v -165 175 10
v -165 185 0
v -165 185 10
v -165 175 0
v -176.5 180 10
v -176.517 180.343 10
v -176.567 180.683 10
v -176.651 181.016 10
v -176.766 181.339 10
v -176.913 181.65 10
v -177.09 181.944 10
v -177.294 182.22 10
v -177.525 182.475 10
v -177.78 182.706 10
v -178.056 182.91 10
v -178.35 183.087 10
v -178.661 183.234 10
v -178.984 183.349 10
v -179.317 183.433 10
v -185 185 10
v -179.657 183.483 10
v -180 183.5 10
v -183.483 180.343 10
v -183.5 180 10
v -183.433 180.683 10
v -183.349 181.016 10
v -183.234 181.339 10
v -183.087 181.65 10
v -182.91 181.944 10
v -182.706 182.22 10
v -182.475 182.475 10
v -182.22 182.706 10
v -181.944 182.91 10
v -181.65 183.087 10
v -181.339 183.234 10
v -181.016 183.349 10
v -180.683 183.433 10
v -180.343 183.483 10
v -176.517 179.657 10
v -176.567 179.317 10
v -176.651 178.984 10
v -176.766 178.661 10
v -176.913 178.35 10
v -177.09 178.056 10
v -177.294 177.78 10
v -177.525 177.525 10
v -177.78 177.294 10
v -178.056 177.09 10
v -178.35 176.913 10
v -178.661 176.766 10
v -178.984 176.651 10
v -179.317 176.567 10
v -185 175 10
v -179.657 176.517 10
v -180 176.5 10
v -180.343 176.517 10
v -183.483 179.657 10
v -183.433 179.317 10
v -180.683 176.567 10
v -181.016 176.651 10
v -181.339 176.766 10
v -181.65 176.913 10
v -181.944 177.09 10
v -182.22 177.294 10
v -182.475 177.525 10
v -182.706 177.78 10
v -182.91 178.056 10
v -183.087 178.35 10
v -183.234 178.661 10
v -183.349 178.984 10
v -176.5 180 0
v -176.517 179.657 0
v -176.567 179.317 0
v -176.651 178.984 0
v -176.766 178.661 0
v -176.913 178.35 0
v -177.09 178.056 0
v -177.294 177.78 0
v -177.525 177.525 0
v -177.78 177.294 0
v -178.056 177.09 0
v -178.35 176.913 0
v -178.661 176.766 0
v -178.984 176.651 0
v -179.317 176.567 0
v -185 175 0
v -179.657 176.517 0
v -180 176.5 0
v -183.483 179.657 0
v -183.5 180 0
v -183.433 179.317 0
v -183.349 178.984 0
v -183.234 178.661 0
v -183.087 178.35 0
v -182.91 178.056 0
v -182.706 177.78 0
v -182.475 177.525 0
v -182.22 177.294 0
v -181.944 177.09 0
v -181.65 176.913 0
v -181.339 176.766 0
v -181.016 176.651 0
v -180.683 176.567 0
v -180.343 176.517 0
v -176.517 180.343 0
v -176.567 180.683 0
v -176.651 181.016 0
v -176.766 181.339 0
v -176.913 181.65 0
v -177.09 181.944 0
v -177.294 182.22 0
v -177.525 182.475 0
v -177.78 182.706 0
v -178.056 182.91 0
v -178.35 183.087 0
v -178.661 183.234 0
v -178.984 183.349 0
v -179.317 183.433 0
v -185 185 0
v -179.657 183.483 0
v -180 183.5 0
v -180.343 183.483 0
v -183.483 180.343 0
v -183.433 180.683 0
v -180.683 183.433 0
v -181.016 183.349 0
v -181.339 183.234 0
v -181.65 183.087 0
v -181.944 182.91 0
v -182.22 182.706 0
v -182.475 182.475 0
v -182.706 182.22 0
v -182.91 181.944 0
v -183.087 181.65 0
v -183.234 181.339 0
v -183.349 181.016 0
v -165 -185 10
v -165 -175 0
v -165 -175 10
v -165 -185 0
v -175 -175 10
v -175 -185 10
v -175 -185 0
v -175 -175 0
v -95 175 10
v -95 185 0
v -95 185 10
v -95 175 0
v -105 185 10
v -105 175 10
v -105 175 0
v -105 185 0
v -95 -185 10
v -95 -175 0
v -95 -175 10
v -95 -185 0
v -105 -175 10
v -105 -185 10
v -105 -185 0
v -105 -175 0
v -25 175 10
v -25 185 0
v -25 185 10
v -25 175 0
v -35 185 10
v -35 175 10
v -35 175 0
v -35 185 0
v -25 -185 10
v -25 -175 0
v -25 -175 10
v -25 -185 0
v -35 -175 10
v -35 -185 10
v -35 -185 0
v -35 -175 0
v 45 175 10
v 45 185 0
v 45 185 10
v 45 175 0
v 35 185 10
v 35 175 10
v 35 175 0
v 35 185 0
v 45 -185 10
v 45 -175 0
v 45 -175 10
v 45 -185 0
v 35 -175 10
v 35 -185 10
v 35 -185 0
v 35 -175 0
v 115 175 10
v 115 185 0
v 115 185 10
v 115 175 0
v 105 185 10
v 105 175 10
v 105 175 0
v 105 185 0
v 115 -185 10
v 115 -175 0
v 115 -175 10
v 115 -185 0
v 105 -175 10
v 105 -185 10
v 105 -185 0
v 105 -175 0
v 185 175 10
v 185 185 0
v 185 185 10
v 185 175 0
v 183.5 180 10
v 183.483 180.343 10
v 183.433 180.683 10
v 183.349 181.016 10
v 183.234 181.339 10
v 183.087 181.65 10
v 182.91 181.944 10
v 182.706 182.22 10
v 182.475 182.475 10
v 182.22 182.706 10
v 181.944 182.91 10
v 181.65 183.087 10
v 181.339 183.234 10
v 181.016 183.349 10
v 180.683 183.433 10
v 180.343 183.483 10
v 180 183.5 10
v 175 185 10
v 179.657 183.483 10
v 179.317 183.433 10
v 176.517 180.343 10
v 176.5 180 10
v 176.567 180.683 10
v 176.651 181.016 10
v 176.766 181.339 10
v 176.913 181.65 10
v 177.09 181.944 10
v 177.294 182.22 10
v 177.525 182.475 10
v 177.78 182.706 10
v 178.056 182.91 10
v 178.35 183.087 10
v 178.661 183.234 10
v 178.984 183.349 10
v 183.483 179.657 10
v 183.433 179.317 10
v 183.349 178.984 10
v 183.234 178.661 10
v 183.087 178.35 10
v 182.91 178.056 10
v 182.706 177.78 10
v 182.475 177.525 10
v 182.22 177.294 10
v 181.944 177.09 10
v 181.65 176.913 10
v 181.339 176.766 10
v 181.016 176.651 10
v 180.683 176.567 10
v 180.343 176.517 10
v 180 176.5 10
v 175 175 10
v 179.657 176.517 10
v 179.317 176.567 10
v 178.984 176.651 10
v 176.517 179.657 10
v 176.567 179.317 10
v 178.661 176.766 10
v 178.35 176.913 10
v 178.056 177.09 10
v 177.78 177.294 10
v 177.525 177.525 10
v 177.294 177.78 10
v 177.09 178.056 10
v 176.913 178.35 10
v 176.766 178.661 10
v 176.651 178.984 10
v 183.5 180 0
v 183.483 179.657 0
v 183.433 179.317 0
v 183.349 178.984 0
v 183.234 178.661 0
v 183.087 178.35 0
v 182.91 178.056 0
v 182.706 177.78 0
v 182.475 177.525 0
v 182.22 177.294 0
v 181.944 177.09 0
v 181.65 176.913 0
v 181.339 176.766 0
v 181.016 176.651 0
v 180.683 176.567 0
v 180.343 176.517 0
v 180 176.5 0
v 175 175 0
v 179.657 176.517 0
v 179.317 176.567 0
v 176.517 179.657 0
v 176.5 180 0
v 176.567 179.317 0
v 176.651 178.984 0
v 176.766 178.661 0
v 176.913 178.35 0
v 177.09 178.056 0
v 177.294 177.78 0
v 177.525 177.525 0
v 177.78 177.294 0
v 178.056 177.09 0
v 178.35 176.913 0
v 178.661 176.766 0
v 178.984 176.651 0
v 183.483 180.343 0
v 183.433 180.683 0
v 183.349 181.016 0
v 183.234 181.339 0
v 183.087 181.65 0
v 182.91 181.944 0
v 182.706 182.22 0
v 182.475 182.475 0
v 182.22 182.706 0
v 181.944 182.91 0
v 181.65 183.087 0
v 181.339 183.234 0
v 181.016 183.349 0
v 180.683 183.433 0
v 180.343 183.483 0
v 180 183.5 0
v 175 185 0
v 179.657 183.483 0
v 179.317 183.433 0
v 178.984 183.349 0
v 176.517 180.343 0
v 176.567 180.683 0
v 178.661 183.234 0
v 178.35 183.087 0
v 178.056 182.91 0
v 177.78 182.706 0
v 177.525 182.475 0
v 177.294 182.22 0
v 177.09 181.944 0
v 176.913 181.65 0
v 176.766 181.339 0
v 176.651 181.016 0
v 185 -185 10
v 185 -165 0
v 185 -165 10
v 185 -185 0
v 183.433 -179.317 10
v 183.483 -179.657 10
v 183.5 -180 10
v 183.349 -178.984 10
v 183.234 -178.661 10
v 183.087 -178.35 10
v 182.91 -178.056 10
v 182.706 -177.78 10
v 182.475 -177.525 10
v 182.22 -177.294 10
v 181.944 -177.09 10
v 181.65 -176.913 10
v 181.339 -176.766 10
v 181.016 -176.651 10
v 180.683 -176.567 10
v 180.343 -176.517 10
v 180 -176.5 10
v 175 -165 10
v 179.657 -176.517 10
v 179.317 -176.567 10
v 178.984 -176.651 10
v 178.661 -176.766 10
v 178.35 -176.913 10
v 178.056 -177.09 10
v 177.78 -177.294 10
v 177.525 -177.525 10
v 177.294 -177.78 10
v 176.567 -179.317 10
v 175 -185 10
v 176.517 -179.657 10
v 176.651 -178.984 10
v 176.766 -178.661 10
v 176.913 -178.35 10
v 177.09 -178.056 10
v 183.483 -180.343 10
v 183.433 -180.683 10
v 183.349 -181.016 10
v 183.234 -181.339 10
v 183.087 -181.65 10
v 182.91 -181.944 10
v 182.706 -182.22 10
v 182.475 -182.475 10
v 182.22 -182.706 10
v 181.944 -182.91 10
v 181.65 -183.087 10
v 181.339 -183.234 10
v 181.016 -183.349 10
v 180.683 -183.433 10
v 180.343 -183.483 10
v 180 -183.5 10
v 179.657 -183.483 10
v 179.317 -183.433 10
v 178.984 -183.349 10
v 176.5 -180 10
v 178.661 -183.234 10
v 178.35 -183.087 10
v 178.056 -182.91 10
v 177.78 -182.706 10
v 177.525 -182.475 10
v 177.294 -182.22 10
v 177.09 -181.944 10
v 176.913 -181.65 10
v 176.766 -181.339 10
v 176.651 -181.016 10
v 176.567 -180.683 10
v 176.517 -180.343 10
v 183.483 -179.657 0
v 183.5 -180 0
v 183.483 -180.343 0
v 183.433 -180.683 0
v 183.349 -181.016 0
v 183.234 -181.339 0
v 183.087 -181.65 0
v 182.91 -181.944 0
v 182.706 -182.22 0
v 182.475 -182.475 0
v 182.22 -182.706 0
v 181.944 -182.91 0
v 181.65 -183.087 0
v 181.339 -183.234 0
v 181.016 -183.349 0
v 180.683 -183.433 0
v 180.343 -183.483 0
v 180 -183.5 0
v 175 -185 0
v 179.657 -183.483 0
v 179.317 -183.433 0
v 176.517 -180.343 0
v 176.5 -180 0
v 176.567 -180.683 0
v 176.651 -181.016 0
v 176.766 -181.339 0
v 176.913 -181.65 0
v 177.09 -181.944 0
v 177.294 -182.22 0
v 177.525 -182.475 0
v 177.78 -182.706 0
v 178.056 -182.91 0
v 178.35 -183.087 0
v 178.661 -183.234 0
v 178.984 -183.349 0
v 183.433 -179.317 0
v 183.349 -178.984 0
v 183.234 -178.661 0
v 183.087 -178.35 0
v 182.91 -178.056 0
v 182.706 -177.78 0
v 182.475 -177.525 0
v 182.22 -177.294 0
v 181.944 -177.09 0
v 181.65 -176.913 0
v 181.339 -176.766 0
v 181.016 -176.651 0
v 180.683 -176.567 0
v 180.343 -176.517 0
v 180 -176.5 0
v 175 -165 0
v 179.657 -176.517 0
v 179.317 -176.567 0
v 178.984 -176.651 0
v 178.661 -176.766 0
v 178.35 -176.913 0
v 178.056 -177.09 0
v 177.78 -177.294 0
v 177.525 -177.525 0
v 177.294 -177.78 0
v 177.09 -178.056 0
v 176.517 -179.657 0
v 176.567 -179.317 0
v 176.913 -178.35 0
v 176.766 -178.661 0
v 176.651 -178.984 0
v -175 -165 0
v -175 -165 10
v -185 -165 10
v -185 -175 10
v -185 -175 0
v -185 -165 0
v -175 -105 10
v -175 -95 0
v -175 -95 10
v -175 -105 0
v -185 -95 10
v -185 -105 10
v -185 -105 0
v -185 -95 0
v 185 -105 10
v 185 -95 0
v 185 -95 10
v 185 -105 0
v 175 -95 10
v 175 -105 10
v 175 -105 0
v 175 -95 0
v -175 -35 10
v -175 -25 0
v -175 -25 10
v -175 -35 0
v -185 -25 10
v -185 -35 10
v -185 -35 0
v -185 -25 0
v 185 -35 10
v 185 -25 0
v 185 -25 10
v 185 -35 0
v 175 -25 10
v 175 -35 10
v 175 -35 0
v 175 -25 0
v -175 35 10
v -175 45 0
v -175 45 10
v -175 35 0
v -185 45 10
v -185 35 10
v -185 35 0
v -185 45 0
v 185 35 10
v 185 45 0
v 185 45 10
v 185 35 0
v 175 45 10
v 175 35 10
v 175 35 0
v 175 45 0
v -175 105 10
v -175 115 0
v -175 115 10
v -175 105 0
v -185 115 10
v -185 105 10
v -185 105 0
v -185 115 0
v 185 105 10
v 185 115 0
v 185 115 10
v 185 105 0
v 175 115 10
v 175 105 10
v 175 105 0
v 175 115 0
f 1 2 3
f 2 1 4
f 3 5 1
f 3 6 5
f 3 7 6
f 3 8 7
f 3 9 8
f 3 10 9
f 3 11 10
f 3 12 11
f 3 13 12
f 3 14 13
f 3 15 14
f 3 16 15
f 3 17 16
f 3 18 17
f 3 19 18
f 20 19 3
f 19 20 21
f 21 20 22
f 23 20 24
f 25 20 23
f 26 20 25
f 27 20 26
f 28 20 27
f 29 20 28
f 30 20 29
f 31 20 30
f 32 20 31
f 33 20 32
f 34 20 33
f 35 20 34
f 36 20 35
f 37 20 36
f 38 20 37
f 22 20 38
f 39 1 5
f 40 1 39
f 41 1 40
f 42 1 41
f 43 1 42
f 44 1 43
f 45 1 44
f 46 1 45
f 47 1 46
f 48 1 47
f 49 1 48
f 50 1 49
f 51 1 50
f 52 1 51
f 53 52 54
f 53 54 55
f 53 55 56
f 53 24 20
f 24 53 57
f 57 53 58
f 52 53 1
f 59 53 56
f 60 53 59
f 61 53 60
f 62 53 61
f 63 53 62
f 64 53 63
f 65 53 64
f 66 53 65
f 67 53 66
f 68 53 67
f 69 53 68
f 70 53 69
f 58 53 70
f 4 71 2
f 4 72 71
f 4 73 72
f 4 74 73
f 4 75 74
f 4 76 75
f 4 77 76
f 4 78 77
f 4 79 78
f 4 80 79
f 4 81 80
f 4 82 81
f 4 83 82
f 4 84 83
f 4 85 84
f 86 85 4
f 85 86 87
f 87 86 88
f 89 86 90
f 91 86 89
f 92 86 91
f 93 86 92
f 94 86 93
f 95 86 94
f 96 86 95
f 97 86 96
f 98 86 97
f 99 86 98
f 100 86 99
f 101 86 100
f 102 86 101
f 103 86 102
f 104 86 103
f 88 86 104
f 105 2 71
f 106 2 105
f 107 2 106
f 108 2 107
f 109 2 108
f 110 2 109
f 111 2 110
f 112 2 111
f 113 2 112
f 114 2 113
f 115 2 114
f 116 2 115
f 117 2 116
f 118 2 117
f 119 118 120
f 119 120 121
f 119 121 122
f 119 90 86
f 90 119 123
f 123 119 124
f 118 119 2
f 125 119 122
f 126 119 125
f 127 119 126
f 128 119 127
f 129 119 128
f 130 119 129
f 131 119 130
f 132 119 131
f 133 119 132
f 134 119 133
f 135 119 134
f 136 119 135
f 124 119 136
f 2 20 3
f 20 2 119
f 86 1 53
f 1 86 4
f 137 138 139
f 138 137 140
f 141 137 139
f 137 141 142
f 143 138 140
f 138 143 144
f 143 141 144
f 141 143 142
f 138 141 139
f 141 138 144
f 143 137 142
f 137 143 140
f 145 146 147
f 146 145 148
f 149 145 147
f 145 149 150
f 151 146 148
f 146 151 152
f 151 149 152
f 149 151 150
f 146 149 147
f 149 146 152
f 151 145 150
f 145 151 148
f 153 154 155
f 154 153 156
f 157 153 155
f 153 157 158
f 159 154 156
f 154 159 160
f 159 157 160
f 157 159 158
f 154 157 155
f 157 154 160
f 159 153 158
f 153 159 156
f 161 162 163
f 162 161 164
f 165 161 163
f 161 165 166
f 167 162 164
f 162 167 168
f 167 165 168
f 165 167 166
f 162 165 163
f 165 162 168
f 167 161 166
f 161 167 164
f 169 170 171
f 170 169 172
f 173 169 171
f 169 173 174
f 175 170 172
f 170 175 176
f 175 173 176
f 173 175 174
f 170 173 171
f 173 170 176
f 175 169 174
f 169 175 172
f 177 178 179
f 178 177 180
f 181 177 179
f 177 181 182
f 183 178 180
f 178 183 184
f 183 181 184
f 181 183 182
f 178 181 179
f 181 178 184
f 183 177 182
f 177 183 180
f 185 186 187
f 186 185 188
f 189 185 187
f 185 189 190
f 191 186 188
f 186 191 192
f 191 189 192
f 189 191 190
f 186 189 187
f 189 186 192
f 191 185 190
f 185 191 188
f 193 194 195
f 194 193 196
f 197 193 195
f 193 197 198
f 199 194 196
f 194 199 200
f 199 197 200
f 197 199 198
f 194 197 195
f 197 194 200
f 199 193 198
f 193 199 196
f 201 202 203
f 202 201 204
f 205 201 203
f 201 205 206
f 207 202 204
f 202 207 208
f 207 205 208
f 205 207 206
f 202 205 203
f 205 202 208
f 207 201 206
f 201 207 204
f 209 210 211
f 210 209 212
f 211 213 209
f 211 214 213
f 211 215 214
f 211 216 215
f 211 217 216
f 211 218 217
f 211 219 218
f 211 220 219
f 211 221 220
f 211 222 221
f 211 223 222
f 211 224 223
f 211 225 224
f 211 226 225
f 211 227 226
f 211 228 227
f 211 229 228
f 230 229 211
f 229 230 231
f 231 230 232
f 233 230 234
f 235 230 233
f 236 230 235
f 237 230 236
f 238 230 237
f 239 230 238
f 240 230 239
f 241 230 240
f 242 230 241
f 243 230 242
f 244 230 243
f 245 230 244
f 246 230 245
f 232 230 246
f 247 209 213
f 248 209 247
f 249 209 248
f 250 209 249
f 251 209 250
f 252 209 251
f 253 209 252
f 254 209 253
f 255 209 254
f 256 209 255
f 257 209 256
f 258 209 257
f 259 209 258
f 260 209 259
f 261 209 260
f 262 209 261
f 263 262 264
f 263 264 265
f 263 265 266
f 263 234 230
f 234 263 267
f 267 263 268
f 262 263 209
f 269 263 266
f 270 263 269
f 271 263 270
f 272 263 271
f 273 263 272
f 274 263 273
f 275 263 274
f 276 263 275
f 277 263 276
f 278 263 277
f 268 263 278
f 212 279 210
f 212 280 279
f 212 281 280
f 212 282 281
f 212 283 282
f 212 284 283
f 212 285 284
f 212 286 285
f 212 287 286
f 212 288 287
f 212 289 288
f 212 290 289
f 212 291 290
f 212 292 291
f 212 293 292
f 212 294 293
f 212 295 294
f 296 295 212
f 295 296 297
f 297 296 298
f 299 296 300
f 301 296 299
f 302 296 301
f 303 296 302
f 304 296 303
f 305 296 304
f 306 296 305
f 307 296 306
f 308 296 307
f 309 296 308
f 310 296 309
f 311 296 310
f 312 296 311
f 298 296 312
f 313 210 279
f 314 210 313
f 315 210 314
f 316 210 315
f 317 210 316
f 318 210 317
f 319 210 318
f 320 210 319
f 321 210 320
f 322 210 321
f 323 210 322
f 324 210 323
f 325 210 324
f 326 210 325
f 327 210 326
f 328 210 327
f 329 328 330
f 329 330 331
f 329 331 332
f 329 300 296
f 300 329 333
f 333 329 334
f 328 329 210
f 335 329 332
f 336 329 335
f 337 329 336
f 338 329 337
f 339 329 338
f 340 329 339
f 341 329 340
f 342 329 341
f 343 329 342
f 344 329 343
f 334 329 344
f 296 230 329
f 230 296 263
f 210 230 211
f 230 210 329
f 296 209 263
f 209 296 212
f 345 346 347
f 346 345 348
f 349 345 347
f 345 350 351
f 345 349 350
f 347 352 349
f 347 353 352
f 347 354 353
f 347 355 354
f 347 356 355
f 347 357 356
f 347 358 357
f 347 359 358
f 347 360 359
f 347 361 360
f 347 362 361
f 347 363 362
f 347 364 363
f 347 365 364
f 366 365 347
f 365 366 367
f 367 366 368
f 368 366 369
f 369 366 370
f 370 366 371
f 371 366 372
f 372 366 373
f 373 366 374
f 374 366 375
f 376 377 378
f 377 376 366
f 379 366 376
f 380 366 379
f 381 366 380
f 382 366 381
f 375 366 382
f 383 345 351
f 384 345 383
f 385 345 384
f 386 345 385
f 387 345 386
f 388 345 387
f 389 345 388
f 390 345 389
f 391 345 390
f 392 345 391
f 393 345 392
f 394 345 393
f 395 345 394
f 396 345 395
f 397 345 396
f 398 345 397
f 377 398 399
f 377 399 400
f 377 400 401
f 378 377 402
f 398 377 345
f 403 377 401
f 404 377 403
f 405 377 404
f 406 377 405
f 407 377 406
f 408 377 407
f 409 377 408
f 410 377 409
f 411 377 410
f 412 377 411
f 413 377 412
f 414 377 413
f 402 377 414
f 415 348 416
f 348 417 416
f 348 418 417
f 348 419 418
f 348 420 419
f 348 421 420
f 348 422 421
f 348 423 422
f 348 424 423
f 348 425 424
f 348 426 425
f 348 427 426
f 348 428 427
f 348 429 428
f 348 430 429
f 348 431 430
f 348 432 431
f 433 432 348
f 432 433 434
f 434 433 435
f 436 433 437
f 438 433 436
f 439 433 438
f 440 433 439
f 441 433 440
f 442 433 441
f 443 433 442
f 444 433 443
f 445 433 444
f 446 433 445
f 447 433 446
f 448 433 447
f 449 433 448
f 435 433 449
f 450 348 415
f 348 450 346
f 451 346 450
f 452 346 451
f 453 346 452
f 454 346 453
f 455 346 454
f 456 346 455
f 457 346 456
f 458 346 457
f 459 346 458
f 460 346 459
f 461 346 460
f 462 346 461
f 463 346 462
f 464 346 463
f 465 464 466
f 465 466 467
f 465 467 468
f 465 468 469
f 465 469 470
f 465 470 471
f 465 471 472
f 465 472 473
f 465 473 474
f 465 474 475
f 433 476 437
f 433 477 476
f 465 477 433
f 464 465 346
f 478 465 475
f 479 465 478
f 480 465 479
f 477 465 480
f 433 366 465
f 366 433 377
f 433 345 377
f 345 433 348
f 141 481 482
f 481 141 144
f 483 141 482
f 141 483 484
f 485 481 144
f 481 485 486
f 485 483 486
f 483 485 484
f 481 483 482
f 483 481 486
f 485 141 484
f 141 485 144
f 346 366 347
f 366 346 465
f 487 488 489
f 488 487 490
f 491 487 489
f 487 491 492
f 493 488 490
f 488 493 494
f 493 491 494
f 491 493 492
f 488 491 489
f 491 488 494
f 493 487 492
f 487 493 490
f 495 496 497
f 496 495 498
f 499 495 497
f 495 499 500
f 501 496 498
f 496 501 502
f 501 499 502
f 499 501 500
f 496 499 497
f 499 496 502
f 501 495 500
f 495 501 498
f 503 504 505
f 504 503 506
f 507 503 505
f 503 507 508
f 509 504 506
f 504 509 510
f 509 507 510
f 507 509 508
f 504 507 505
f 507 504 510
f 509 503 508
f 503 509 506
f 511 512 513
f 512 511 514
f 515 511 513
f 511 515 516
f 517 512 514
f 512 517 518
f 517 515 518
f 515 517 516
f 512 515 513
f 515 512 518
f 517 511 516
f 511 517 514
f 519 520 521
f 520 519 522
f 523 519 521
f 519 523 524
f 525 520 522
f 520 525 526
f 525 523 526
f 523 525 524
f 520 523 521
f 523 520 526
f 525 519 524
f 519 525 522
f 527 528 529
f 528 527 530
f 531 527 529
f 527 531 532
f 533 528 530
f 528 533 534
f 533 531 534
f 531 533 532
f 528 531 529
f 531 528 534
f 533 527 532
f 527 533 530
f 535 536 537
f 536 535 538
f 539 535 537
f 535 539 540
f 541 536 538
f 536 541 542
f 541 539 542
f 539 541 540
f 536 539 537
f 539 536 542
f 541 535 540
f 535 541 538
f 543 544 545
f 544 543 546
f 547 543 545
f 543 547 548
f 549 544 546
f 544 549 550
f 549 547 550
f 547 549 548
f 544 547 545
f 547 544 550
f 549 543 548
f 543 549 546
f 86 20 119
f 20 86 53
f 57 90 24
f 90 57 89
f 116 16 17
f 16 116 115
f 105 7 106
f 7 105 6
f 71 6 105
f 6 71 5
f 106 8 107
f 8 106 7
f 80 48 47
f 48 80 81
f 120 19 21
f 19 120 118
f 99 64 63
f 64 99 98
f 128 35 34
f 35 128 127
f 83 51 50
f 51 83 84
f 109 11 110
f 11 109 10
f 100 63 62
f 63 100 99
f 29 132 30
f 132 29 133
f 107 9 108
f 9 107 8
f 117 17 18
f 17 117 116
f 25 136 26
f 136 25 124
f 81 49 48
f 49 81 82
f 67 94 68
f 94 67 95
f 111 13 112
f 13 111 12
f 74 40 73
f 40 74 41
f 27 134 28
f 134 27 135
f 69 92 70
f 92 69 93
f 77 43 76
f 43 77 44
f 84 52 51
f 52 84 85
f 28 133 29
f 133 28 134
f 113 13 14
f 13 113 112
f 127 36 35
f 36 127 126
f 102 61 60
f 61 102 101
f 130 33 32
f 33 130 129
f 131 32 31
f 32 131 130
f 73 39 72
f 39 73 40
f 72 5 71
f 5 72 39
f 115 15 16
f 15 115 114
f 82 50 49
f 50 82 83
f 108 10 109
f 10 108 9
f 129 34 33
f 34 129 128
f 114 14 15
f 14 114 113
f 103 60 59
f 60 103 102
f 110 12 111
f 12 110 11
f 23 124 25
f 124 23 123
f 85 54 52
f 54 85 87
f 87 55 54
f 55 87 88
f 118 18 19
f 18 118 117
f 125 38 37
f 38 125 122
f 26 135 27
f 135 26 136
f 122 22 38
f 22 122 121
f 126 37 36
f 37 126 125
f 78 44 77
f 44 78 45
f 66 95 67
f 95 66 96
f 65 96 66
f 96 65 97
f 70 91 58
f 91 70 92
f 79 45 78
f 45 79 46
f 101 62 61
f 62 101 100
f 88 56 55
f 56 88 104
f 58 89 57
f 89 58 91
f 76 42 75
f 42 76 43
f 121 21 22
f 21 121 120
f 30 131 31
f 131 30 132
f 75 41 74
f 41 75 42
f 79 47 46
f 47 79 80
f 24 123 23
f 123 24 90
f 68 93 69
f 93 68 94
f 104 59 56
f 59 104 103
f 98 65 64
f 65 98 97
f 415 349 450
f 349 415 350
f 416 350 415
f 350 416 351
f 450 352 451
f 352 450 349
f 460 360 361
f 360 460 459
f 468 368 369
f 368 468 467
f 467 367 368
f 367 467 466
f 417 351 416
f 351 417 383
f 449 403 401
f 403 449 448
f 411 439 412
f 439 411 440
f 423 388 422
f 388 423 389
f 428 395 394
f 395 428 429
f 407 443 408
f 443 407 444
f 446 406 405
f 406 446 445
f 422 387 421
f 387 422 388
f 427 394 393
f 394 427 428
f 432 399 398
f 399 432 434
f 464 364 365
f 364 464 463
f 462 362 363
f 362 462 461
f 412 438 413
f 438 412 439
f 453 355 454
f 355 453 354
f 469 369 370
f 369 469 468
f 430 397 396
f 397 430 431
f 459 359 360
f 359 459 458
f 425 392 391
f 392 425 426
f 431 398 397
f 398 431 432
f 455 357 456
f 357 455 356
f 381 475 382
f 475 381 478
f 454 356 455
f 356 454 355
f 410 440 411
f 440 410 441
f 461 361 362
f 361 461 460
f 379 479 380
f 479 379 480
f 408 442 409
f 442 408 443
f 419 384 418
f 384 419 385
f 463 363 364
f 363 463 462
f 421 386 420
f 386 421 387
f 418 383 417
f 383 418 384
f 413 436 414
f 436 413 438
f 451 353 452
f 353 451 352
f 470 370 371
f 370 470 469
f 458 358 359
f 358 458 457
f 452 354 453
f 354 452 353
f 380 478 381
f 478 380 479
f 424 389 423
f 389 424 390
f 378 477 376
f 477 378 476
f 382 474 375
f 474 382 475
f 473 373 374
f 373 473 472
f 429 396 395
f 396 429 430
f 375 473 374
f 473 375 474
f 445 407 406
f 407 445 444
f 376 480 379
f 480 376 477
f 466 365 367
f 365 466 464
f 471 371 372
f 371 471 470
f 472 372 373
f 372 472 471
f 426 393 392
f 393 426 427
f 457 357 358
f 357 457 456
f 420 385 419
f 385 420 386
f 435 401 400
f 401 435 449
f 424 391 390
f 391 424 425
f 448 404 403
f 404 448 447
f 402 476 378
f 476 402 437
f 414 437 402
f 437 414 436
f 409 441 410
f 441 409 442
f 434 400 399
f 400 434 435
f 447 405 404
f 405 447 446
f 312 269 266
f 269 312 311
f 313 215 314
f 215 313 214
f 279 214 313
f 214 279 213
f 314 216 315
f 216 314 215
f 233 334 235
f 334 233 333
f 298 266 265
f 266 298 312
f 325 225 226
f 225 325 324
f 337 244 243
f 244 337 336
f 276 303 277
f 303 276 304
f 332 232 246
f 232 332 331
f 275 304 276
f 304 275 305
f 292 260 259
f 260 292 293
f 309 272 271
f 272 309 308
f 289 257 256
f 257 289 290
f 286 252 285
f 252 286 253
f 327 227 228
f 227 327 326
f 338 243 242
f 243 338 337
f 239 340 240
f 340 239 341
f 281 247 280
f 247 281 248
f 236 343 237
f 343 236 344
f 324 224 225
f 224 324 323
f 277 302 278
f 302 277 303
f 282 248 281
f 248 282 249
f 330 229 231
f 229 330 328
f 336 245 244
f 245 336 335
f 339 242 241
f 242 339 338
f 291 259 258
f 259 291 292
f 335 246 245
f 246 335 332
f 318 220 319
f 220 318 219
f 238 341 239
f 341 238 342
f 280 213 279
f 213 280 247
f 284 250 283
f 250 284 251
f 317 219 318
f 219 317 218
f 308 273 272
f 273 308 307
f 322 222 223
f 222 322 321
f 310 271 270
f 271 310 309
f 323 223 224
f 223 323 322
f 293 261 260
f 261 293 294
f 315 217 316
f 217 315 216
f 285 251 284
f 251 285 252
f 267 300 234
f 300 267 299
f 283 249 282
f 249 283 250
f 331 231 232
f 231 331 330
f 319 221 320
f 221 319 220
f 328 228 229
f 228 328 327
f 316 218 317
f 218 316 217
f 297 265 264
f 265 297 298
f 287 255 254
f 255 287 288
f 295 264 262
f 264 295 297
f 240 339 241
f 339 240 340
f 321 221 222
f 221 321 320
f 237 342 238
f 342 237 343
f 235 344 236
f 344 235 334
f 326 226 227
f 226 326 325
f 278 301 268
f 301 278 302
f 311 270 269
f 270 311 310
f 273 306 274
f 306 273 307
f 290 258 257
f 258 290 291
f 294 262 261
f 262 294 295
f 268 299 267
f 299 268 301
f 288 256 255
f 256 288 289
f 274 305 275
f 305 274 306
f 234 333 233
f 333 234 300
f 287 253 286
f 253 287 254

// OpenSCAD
// ring_14.scad - ring index 14 (z bottom = 140 mm)
$fn = 64; bar = 10; half_b = bar/2; outer = 370; half_outer = outer/2;
front_y = 180; back_y = -180; left_x = -180; right_x = 180;
x_centers = [-170, -100, -30, 40, 110, 180];
z_centers = [5, 85, 155, 225, 295, 365, 435, 505, 575, 645, 715]; ring_z = 140;
module place_box(cx, cy, sx, sy) { translate([cx - sx/2, cy - sy/2, 0]) cube([sx, sy, bar]); }

difference() { union() {
    for (x = x_centers) { place_box(x, front_y, bar, bar); place_box(x, back_y, bar, bar); }
    for (y = x_centers) { place_box(left_x, y, bar, bar); place_box(right_x, y, bar, bar); }
    for (zc = z_centers) if ((zc - half_b < ring_z + bar) && (zc + half_b > ring_z)) {
        translate([-half_outer, front_y - half_b, 0]) cube([outer, bar, bar]);
        translate([-half_outer, back_y - half_b, 0])  cube([outer, bar, bar]);
        translate([left_x - half_b, -half_outer, 0])  cube([bar, outer, bar]);
        translate([right_x - half_b, -half_outer, 0]) cube([bar, outer, bar]);
    }
  }
  for (cx = [-180, 180]) for (cy = [-180, 180]) translate([cx, cy, 0]) cylinder(h = bar, r = 3.5, $fn = 64);
}
